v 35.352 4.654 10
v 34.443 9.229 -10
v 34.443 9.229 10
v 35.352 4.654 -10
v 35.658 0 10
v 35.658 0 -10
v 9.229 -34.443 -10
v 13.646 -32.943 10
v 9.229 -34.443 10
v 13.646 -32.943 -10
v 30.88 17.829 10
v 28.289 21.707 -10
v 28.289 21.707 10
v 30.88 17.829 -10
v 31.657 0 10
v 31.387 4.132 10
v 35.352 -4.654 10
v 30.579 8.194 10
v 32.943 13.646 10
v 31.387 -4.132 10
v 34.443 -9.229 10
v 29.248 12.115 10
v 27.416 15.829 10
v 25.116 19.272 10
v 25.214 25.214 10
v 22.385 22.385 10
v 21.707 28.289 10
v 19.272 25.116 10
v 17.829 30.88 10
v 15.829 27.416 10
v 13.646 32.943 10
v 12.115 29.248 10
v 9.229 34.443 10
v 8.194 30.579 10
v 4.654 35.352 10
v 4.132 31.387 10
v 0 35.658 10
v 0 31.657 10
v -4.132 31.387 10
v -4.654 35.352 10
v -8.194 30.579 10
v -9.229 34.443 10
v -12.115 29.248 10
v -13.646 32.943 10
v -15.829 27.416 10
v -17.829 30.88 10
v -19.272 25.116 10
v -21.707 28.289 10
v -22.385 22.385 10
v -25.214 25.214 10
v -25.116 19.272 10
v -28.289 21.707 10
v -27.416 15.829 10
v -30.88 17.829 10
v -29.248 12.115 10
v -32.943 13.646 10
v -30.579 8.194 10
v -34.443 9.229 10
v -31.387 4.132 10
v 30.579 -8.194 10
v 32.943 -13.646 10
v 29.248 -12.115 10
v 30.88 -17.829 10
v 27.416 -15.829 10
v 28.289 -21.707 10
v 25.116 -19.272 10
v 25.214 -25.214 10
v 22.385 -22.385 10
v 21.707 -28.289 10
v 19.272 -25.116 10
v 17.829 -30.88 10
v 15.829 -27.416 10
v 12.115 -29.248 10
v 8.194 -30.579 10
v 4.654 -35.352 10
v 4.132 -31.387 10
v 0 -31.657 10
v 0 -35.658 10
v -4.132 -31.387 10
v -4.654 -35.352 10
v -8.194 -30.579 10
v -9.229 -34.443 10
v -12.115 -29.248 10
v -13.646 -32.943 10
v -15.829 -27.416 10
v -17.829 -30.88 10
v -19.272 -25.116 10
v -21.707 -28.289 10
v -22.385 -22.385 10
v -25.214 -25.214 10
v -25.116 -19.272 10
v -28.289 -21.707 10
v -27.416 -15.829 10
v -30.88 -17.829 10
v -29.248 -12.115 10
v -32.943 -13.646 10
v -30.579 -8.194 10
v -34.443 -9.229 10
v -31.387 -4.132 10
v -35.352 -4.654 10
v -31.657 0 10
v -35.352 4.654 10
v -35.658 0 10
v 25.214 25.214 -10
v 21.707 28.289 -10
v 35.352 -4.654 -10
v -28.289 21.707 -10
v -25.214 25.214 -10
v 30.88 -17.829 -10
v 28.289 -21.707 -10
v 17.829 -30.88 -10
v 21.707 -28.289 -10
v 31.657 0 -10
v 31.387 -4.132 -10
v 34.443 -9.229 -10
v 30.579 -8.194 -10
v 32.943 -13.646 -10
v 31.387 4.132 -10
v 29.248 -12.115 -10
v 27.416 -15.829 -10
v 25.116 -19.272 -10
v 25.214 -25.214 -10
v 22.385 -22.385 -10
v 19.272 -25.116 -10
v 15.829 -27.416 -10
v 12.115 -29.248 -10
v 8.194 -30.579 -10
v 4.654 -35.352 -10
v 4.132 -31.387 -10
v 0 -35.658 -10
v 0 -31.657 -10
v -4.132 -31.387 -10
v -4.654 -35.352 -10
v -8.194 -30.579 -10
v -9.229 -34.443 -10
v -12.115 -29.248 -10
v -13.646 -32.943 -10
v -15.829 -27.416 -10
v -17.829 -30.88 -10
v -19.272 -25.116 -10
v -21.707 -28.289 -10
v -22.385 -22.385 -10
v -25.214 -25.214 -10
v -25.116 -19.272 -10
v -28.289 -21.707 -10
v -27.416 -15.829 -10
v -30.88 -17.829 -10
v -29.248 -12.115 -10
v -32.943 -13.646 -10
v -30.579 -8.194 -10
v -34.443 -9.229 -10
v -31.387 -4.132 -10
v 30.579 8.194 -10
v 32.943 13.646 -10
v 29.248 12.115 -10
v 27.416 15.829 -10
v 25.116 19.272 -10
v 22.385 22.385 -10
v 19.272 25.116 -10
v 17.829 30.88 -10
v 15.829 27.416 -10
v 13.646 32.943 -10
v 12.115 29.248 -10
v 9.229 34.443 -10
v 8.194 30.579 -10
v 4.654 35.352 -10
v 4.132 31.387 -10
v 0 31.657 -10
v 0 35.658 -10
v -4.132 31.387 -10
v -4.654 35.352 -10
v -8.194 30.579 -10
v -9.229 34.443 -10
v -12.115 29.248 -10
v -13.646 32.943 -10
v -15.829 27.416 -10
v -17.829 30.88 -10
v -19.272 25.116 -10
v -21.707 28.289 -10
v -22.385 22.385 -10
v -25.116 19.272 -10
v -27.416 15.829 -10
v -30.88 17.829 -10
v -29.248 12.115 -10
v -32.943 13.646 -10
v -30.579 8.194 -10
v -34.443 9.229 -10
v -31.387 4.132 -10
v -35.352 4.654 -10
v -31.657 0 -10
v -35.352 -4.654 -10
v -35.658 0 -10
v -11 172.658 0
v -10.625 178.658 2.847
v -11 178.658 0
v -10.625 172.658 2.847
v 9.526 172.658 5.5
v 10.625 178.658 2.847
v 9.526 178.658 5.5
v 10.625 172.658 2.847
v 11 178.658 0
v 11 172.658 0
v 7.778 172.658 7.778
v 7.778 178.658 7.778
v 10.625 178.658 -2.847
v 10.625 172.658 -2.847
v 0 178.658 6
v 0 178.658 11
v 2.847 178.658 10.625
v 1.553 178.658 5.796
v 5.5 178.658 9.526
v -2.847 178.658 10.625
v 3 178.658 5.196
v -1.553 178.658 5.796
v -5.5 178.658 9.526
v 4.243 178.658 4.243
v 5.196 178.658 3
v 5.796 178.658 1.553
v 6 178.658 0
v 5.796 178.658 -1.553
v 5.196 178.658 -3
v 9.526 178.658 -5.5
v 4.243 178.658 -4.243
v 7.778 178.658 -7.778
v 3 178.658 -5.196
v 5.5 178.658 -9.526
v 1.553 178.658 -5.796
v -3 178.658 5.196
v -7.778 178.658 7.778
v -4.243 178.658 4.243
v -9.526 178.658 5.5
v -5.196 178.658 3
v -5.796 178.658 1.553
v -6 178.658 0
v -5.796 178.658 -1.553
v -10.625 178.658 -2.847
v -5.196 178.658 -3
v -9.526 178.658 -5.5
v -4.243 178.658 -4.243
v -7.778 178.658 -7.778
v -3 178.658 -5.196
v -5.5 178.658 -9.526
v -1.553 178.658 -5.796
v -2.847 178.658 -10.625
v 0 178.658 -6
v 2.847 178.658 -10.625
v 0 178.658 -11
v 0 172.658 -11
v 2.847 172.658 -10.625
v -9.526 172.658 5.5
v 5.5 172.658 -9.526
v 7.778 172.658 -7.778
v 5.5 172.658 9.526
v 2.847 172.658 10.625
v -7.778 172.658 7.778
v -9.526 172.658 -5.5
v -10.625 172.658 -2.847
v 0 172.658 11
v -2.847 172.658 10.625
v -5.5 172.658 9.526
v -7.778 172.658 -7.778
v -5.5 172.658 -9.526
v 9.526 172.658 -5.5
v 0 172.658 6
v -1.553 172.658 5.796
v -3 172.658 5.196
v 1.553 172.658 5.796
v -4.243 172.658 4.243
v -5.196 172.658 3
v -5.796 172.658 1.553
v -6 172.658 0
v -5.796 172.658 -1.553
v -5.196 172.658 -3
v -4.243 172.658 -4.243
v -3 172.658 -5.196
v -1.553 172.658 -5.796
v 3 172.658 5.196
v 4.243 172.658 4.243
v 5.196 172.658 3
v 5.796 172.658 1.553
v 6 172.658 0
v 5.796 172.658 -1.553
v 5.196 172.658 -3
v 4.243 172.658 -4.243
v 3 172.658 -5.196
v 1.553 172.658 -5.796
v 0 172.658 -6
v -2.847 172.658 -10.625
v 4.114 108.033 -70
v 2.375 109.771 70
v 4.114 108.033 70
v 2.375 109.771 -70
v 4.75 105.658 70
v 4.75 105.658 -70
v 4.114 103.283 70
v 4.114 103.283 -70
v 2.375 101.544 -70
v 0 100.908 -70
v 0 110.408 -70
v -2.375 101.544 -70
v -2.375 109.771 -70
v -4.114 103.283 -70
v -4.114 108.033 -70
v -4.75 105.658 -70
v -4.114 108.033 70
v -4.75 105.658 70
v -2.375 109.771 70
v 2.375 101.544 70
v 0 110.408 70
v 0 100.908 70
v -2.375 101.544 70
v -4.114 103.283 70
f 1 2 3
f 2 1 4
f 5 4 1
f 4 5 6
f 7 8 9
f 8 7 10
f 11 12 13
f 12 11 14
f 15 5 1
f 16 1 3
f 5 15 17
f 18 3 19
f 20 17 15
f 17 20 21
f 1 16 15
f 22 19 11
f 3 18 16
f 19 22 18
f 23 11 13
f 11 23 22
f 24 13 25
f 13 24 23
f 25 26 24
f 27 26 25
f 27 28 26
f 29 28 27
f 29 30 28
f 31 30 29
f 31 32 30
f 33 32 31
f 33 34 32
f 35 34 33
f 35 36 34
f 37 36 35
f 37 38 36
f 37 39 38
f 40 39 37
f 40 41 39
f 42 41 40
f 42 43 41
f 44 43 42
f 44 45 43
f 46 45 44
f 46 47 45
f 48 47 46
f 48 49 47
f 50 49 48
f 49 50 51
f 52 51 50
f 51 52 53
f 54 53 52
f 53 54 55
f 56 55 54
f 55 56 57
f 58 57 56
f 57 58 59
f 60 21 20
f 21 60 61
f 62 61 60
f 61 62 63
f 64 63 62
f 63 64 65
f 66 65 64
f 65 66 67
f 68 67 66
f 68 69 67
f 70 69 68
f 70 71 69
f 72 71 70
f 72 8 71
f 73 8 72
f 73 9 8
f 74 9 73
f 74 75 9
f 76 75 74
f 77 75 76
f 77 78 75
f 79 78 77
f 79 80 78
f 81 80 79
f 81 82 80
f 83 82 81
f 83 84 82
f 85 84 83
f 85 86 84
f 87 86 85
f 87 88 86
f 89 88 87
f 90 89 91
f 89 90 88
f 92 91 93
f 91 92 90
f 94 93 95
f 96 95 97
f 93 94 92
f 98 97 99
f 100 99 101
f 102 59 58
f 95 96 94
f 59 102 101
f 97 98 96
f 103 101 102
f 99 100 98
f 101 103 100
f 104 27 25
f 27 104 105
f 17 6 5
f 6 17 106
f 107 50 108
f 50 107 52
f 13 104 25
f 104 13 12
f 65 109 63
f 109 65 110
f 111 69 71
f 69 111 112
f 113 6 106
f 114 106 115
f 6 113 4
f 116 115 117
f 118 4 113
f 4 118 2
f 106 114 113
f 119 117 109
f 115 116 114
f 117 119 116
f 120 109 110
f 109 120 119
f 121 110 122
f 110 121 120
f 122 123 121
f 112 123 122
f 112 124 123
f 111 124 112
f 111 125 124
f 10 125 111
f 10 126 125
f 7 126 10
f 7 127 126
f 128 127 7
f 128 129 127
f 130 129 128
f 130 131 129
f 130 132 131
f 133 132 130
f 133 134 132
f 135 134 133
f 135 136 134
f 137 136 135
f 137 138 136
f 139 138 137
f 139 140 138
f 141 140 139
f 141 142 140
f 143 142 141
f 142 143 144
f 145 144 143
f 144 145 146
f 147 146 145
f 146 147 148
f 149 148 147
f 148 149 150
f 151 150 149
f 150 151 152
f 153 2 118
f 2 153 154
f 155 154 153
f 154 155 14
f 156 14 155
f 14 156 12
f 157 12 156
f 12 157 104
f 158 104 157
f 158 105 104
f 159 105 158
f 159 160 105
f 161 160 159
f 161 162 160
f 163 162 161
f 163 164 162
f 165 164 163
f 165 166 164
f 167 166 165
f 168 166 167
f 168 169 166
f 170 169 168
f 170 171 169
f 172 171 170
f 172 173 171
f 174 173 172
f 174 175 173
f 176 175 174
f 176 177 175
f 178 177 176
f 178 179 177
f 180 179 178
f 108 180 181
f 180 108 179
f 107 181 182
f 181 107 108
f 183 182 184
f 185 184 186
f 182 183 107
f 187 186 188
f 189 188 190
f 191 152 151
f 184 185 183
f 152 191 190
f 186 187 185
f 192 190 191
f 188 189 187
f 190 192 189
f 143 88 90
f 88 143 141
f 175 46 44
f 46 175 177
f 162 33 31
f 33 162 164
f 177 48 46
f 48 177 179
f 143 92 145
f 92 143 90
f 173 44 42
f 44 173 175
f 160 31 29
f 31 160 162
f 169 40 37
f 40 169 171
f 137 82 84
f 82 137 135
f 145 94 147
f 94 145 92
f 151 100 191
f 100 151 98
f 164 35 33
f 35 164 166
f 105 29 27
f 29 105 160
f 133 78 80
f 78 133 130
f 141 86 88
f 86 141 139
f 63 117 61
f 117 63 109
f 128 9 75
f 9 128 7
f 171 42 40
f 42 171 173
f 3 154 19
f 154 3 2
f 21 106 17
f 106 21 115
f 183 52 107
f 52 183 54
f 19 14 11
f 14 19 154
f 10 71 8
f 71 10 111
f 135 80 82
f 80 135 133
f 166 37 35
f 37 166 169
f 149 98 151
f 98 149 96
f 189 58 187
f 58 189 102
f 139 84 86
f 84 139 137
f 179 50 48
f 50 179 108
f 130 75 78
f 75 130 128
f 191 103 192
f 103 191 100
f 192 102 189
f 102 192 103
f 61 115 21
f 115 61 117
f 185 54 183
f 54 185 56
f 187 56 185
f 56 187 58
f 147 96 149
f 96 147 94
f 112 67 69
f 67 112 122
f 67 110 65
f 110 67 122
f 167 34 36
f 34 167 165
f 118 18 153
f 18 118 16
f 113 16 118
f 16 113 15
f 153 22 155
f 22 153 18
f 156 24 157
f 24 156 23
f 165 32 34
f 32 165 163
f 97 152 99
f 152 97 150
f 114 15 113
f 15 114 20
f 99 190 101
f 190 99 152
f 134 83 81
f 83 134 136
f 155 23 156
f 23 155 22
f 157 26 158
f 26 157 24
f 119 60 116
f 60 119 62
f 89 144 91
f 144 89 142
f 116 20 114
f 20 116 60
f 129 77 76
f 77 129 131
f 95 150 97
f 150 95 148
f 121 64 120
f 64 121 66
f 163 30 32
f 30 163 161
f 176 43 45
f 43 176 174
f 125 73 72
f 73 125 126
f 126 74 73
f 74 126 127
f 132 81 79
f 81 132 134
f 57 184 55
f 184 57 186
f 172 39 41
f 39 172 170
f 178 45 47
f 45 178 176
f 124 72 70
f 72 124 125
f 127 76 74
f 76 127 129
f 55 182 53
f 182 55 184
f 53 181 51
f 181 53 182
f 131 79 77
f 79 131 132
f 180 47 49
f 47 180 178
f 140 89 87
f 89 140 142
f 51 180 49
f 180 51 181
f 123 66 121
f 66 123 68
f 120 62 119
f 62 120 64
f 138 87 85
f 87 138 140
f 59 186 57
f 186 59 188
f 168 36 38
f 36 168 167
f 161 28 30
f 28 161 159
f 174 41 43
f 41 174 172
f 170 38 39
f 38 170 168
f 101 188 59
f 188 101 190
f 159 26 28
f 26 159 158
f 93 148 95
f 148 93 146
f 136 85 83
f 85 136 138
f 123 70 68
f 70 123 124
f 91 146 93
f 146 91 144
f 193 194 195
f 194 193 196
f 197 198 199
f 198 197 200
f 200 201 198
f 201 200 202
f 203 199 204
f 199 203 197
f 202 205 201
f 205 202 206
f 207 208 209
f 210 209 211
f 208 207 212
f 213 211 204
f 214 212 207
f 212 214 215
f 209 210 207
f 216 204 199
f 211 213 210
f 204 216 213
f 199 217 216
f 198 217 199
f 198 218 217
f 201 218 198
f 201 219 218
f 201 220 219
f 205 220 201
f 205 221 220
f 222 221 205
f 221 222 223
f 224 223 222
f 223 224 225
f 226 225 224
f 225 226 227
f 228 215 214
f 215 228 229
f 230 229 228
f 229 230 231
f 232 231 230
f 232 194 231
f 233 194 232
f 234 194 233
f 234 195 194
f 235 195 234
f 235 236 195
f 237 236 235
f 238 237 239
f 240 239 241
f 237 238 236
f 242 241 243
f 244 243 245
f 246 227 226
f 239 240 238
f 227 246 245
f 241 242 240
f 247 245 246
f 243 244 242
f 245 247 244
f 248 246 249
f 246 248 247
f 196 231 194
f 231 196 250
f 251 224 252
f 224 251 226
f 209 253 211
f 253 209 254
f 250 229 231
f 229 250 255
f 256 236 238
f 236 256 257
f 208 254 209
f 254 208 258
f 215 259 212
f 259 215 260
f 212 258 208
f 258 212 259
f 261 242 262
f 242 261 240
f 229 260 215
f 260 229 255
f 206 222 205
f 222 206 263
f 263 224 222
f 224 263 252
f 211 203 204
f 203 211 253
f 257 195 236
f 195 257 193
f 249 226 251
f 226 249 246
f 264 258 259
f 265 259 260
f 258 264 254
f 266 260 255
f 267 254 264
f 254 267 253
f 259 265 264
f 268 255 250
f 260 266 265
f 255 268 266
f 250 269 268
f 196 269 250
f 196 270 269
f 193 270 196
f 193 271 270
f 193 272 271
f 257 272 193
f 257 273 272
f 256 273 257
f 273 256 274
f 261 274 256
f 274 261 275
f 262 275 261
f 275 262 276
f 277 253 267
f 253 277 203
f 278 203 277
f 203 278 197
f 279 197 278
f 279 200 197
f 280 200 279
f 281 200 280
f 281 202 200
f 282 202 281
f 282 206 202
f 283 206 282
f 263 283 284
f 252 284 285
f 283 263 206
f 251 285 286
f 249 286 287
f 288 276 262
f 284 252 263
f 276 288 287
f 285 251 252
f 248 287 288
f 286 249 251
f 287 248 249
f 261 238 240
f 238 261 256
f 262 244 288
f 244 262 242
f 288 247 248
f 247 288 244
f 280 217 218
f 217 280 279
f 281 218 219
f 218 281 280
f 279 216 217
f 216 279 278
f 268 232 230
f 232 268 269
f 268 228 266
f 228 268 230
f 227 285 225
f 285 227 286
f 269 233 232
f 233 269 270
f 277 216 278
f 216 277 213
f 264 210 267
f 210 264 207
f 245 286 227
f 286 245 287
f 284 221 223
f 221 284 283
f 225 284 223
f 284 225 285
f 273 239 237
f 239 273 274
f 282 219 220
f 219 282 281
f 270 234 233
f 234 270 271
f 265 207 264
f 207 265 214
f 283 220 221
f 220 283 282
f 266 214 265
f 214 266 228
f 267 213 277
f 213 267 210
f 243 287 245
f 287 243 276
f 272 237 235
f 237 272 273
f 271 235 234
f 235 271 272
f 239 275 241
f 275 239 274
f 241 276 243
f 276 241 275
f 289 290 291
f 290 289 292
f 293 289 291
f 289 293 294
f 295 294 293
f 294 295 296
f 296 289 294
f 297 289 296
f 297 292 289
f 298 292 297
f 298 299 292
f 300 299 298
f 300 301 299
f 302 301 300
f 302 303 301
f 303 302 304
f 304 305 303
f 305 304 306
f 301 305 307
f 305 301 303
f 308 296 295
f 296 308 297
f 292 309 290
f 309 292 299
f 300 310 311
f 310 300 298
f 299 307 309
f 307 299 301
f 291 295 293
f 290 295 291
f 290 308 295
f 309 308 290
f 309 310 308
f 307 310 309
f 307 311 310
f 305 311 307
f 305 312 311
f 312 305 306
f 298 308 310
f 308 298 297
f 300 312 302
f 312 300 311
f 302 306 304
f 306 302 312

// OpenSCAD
// Auto-generated by scripts/author_from_manifest.py (Phase D.3).
// Source: data/phase_d_manifest.json (sku_intent='tolco-fig4-swivel-ring-2in').
// Do not hand-edit — regenerate from the manifest.
//
// @part tolco_fig4_swivel_ring_2in
// @kind hanger
// @category hanger.swivel.ring
// @display-name "Tolco FIG 4 Adjustable Swivel Ring Hanger 2\""
// @mfg nvent_tolco
// @mfg-pn FIG_4_2in
// @listing UL
// @price-usd 5.10
// @install-minutes 4
// @crew journeyman
// @param size_in number default=2 label="Size" unit="in"
// @port pipe position=[0,0,0] direction=[0,1,0] style=grooved size_in=2 role=run_a

size_in = 2.0;

function od_mm(nps) =
    nps ==   1  ? 33.4 :
    nps == 1.25 ? 42.2 :
    nps == 1.5  ? 48.3 :
    nps ==   2  ? 60.3 :
    nps == 2.5  ? 73.0 :
    nps ==   3  ? 88.9 :
    nps ==   4  ? 114.3 :
    nps ==   6  ? 168.3 :
    nps ==   8  ? 219.1 : 60.3;

od = od_mm(size_in);
ring_id = od * 1.05;
ring_od = ring_id + 8;
strap_w = 20;
rod_len = 140;

union() {
    // Ring
    difference() {
        cylinder(h = strap_w, d = ring_od, center = true, $fn = 48);
        cylinder(h = strap_w + 1, d = ring_id, center = true, $fn = 48);
    }
    // Rod up +Y
    translate([0, rod_len/2 + ring_od/2, 0])
        cylinder(h = rod_len, d = 9.5, center = true, $fn = 12);
    // Top swivel eye
    translate([0, rod_len + ring_od/2, 0])
        rotate([90, 0, 0])
        difference() {
            cylinder(h = 6, d = 22, center = true, $fn = 24);
            cylinder(h = 8, d = 12, center = true, $fn = 24);
        }
}
